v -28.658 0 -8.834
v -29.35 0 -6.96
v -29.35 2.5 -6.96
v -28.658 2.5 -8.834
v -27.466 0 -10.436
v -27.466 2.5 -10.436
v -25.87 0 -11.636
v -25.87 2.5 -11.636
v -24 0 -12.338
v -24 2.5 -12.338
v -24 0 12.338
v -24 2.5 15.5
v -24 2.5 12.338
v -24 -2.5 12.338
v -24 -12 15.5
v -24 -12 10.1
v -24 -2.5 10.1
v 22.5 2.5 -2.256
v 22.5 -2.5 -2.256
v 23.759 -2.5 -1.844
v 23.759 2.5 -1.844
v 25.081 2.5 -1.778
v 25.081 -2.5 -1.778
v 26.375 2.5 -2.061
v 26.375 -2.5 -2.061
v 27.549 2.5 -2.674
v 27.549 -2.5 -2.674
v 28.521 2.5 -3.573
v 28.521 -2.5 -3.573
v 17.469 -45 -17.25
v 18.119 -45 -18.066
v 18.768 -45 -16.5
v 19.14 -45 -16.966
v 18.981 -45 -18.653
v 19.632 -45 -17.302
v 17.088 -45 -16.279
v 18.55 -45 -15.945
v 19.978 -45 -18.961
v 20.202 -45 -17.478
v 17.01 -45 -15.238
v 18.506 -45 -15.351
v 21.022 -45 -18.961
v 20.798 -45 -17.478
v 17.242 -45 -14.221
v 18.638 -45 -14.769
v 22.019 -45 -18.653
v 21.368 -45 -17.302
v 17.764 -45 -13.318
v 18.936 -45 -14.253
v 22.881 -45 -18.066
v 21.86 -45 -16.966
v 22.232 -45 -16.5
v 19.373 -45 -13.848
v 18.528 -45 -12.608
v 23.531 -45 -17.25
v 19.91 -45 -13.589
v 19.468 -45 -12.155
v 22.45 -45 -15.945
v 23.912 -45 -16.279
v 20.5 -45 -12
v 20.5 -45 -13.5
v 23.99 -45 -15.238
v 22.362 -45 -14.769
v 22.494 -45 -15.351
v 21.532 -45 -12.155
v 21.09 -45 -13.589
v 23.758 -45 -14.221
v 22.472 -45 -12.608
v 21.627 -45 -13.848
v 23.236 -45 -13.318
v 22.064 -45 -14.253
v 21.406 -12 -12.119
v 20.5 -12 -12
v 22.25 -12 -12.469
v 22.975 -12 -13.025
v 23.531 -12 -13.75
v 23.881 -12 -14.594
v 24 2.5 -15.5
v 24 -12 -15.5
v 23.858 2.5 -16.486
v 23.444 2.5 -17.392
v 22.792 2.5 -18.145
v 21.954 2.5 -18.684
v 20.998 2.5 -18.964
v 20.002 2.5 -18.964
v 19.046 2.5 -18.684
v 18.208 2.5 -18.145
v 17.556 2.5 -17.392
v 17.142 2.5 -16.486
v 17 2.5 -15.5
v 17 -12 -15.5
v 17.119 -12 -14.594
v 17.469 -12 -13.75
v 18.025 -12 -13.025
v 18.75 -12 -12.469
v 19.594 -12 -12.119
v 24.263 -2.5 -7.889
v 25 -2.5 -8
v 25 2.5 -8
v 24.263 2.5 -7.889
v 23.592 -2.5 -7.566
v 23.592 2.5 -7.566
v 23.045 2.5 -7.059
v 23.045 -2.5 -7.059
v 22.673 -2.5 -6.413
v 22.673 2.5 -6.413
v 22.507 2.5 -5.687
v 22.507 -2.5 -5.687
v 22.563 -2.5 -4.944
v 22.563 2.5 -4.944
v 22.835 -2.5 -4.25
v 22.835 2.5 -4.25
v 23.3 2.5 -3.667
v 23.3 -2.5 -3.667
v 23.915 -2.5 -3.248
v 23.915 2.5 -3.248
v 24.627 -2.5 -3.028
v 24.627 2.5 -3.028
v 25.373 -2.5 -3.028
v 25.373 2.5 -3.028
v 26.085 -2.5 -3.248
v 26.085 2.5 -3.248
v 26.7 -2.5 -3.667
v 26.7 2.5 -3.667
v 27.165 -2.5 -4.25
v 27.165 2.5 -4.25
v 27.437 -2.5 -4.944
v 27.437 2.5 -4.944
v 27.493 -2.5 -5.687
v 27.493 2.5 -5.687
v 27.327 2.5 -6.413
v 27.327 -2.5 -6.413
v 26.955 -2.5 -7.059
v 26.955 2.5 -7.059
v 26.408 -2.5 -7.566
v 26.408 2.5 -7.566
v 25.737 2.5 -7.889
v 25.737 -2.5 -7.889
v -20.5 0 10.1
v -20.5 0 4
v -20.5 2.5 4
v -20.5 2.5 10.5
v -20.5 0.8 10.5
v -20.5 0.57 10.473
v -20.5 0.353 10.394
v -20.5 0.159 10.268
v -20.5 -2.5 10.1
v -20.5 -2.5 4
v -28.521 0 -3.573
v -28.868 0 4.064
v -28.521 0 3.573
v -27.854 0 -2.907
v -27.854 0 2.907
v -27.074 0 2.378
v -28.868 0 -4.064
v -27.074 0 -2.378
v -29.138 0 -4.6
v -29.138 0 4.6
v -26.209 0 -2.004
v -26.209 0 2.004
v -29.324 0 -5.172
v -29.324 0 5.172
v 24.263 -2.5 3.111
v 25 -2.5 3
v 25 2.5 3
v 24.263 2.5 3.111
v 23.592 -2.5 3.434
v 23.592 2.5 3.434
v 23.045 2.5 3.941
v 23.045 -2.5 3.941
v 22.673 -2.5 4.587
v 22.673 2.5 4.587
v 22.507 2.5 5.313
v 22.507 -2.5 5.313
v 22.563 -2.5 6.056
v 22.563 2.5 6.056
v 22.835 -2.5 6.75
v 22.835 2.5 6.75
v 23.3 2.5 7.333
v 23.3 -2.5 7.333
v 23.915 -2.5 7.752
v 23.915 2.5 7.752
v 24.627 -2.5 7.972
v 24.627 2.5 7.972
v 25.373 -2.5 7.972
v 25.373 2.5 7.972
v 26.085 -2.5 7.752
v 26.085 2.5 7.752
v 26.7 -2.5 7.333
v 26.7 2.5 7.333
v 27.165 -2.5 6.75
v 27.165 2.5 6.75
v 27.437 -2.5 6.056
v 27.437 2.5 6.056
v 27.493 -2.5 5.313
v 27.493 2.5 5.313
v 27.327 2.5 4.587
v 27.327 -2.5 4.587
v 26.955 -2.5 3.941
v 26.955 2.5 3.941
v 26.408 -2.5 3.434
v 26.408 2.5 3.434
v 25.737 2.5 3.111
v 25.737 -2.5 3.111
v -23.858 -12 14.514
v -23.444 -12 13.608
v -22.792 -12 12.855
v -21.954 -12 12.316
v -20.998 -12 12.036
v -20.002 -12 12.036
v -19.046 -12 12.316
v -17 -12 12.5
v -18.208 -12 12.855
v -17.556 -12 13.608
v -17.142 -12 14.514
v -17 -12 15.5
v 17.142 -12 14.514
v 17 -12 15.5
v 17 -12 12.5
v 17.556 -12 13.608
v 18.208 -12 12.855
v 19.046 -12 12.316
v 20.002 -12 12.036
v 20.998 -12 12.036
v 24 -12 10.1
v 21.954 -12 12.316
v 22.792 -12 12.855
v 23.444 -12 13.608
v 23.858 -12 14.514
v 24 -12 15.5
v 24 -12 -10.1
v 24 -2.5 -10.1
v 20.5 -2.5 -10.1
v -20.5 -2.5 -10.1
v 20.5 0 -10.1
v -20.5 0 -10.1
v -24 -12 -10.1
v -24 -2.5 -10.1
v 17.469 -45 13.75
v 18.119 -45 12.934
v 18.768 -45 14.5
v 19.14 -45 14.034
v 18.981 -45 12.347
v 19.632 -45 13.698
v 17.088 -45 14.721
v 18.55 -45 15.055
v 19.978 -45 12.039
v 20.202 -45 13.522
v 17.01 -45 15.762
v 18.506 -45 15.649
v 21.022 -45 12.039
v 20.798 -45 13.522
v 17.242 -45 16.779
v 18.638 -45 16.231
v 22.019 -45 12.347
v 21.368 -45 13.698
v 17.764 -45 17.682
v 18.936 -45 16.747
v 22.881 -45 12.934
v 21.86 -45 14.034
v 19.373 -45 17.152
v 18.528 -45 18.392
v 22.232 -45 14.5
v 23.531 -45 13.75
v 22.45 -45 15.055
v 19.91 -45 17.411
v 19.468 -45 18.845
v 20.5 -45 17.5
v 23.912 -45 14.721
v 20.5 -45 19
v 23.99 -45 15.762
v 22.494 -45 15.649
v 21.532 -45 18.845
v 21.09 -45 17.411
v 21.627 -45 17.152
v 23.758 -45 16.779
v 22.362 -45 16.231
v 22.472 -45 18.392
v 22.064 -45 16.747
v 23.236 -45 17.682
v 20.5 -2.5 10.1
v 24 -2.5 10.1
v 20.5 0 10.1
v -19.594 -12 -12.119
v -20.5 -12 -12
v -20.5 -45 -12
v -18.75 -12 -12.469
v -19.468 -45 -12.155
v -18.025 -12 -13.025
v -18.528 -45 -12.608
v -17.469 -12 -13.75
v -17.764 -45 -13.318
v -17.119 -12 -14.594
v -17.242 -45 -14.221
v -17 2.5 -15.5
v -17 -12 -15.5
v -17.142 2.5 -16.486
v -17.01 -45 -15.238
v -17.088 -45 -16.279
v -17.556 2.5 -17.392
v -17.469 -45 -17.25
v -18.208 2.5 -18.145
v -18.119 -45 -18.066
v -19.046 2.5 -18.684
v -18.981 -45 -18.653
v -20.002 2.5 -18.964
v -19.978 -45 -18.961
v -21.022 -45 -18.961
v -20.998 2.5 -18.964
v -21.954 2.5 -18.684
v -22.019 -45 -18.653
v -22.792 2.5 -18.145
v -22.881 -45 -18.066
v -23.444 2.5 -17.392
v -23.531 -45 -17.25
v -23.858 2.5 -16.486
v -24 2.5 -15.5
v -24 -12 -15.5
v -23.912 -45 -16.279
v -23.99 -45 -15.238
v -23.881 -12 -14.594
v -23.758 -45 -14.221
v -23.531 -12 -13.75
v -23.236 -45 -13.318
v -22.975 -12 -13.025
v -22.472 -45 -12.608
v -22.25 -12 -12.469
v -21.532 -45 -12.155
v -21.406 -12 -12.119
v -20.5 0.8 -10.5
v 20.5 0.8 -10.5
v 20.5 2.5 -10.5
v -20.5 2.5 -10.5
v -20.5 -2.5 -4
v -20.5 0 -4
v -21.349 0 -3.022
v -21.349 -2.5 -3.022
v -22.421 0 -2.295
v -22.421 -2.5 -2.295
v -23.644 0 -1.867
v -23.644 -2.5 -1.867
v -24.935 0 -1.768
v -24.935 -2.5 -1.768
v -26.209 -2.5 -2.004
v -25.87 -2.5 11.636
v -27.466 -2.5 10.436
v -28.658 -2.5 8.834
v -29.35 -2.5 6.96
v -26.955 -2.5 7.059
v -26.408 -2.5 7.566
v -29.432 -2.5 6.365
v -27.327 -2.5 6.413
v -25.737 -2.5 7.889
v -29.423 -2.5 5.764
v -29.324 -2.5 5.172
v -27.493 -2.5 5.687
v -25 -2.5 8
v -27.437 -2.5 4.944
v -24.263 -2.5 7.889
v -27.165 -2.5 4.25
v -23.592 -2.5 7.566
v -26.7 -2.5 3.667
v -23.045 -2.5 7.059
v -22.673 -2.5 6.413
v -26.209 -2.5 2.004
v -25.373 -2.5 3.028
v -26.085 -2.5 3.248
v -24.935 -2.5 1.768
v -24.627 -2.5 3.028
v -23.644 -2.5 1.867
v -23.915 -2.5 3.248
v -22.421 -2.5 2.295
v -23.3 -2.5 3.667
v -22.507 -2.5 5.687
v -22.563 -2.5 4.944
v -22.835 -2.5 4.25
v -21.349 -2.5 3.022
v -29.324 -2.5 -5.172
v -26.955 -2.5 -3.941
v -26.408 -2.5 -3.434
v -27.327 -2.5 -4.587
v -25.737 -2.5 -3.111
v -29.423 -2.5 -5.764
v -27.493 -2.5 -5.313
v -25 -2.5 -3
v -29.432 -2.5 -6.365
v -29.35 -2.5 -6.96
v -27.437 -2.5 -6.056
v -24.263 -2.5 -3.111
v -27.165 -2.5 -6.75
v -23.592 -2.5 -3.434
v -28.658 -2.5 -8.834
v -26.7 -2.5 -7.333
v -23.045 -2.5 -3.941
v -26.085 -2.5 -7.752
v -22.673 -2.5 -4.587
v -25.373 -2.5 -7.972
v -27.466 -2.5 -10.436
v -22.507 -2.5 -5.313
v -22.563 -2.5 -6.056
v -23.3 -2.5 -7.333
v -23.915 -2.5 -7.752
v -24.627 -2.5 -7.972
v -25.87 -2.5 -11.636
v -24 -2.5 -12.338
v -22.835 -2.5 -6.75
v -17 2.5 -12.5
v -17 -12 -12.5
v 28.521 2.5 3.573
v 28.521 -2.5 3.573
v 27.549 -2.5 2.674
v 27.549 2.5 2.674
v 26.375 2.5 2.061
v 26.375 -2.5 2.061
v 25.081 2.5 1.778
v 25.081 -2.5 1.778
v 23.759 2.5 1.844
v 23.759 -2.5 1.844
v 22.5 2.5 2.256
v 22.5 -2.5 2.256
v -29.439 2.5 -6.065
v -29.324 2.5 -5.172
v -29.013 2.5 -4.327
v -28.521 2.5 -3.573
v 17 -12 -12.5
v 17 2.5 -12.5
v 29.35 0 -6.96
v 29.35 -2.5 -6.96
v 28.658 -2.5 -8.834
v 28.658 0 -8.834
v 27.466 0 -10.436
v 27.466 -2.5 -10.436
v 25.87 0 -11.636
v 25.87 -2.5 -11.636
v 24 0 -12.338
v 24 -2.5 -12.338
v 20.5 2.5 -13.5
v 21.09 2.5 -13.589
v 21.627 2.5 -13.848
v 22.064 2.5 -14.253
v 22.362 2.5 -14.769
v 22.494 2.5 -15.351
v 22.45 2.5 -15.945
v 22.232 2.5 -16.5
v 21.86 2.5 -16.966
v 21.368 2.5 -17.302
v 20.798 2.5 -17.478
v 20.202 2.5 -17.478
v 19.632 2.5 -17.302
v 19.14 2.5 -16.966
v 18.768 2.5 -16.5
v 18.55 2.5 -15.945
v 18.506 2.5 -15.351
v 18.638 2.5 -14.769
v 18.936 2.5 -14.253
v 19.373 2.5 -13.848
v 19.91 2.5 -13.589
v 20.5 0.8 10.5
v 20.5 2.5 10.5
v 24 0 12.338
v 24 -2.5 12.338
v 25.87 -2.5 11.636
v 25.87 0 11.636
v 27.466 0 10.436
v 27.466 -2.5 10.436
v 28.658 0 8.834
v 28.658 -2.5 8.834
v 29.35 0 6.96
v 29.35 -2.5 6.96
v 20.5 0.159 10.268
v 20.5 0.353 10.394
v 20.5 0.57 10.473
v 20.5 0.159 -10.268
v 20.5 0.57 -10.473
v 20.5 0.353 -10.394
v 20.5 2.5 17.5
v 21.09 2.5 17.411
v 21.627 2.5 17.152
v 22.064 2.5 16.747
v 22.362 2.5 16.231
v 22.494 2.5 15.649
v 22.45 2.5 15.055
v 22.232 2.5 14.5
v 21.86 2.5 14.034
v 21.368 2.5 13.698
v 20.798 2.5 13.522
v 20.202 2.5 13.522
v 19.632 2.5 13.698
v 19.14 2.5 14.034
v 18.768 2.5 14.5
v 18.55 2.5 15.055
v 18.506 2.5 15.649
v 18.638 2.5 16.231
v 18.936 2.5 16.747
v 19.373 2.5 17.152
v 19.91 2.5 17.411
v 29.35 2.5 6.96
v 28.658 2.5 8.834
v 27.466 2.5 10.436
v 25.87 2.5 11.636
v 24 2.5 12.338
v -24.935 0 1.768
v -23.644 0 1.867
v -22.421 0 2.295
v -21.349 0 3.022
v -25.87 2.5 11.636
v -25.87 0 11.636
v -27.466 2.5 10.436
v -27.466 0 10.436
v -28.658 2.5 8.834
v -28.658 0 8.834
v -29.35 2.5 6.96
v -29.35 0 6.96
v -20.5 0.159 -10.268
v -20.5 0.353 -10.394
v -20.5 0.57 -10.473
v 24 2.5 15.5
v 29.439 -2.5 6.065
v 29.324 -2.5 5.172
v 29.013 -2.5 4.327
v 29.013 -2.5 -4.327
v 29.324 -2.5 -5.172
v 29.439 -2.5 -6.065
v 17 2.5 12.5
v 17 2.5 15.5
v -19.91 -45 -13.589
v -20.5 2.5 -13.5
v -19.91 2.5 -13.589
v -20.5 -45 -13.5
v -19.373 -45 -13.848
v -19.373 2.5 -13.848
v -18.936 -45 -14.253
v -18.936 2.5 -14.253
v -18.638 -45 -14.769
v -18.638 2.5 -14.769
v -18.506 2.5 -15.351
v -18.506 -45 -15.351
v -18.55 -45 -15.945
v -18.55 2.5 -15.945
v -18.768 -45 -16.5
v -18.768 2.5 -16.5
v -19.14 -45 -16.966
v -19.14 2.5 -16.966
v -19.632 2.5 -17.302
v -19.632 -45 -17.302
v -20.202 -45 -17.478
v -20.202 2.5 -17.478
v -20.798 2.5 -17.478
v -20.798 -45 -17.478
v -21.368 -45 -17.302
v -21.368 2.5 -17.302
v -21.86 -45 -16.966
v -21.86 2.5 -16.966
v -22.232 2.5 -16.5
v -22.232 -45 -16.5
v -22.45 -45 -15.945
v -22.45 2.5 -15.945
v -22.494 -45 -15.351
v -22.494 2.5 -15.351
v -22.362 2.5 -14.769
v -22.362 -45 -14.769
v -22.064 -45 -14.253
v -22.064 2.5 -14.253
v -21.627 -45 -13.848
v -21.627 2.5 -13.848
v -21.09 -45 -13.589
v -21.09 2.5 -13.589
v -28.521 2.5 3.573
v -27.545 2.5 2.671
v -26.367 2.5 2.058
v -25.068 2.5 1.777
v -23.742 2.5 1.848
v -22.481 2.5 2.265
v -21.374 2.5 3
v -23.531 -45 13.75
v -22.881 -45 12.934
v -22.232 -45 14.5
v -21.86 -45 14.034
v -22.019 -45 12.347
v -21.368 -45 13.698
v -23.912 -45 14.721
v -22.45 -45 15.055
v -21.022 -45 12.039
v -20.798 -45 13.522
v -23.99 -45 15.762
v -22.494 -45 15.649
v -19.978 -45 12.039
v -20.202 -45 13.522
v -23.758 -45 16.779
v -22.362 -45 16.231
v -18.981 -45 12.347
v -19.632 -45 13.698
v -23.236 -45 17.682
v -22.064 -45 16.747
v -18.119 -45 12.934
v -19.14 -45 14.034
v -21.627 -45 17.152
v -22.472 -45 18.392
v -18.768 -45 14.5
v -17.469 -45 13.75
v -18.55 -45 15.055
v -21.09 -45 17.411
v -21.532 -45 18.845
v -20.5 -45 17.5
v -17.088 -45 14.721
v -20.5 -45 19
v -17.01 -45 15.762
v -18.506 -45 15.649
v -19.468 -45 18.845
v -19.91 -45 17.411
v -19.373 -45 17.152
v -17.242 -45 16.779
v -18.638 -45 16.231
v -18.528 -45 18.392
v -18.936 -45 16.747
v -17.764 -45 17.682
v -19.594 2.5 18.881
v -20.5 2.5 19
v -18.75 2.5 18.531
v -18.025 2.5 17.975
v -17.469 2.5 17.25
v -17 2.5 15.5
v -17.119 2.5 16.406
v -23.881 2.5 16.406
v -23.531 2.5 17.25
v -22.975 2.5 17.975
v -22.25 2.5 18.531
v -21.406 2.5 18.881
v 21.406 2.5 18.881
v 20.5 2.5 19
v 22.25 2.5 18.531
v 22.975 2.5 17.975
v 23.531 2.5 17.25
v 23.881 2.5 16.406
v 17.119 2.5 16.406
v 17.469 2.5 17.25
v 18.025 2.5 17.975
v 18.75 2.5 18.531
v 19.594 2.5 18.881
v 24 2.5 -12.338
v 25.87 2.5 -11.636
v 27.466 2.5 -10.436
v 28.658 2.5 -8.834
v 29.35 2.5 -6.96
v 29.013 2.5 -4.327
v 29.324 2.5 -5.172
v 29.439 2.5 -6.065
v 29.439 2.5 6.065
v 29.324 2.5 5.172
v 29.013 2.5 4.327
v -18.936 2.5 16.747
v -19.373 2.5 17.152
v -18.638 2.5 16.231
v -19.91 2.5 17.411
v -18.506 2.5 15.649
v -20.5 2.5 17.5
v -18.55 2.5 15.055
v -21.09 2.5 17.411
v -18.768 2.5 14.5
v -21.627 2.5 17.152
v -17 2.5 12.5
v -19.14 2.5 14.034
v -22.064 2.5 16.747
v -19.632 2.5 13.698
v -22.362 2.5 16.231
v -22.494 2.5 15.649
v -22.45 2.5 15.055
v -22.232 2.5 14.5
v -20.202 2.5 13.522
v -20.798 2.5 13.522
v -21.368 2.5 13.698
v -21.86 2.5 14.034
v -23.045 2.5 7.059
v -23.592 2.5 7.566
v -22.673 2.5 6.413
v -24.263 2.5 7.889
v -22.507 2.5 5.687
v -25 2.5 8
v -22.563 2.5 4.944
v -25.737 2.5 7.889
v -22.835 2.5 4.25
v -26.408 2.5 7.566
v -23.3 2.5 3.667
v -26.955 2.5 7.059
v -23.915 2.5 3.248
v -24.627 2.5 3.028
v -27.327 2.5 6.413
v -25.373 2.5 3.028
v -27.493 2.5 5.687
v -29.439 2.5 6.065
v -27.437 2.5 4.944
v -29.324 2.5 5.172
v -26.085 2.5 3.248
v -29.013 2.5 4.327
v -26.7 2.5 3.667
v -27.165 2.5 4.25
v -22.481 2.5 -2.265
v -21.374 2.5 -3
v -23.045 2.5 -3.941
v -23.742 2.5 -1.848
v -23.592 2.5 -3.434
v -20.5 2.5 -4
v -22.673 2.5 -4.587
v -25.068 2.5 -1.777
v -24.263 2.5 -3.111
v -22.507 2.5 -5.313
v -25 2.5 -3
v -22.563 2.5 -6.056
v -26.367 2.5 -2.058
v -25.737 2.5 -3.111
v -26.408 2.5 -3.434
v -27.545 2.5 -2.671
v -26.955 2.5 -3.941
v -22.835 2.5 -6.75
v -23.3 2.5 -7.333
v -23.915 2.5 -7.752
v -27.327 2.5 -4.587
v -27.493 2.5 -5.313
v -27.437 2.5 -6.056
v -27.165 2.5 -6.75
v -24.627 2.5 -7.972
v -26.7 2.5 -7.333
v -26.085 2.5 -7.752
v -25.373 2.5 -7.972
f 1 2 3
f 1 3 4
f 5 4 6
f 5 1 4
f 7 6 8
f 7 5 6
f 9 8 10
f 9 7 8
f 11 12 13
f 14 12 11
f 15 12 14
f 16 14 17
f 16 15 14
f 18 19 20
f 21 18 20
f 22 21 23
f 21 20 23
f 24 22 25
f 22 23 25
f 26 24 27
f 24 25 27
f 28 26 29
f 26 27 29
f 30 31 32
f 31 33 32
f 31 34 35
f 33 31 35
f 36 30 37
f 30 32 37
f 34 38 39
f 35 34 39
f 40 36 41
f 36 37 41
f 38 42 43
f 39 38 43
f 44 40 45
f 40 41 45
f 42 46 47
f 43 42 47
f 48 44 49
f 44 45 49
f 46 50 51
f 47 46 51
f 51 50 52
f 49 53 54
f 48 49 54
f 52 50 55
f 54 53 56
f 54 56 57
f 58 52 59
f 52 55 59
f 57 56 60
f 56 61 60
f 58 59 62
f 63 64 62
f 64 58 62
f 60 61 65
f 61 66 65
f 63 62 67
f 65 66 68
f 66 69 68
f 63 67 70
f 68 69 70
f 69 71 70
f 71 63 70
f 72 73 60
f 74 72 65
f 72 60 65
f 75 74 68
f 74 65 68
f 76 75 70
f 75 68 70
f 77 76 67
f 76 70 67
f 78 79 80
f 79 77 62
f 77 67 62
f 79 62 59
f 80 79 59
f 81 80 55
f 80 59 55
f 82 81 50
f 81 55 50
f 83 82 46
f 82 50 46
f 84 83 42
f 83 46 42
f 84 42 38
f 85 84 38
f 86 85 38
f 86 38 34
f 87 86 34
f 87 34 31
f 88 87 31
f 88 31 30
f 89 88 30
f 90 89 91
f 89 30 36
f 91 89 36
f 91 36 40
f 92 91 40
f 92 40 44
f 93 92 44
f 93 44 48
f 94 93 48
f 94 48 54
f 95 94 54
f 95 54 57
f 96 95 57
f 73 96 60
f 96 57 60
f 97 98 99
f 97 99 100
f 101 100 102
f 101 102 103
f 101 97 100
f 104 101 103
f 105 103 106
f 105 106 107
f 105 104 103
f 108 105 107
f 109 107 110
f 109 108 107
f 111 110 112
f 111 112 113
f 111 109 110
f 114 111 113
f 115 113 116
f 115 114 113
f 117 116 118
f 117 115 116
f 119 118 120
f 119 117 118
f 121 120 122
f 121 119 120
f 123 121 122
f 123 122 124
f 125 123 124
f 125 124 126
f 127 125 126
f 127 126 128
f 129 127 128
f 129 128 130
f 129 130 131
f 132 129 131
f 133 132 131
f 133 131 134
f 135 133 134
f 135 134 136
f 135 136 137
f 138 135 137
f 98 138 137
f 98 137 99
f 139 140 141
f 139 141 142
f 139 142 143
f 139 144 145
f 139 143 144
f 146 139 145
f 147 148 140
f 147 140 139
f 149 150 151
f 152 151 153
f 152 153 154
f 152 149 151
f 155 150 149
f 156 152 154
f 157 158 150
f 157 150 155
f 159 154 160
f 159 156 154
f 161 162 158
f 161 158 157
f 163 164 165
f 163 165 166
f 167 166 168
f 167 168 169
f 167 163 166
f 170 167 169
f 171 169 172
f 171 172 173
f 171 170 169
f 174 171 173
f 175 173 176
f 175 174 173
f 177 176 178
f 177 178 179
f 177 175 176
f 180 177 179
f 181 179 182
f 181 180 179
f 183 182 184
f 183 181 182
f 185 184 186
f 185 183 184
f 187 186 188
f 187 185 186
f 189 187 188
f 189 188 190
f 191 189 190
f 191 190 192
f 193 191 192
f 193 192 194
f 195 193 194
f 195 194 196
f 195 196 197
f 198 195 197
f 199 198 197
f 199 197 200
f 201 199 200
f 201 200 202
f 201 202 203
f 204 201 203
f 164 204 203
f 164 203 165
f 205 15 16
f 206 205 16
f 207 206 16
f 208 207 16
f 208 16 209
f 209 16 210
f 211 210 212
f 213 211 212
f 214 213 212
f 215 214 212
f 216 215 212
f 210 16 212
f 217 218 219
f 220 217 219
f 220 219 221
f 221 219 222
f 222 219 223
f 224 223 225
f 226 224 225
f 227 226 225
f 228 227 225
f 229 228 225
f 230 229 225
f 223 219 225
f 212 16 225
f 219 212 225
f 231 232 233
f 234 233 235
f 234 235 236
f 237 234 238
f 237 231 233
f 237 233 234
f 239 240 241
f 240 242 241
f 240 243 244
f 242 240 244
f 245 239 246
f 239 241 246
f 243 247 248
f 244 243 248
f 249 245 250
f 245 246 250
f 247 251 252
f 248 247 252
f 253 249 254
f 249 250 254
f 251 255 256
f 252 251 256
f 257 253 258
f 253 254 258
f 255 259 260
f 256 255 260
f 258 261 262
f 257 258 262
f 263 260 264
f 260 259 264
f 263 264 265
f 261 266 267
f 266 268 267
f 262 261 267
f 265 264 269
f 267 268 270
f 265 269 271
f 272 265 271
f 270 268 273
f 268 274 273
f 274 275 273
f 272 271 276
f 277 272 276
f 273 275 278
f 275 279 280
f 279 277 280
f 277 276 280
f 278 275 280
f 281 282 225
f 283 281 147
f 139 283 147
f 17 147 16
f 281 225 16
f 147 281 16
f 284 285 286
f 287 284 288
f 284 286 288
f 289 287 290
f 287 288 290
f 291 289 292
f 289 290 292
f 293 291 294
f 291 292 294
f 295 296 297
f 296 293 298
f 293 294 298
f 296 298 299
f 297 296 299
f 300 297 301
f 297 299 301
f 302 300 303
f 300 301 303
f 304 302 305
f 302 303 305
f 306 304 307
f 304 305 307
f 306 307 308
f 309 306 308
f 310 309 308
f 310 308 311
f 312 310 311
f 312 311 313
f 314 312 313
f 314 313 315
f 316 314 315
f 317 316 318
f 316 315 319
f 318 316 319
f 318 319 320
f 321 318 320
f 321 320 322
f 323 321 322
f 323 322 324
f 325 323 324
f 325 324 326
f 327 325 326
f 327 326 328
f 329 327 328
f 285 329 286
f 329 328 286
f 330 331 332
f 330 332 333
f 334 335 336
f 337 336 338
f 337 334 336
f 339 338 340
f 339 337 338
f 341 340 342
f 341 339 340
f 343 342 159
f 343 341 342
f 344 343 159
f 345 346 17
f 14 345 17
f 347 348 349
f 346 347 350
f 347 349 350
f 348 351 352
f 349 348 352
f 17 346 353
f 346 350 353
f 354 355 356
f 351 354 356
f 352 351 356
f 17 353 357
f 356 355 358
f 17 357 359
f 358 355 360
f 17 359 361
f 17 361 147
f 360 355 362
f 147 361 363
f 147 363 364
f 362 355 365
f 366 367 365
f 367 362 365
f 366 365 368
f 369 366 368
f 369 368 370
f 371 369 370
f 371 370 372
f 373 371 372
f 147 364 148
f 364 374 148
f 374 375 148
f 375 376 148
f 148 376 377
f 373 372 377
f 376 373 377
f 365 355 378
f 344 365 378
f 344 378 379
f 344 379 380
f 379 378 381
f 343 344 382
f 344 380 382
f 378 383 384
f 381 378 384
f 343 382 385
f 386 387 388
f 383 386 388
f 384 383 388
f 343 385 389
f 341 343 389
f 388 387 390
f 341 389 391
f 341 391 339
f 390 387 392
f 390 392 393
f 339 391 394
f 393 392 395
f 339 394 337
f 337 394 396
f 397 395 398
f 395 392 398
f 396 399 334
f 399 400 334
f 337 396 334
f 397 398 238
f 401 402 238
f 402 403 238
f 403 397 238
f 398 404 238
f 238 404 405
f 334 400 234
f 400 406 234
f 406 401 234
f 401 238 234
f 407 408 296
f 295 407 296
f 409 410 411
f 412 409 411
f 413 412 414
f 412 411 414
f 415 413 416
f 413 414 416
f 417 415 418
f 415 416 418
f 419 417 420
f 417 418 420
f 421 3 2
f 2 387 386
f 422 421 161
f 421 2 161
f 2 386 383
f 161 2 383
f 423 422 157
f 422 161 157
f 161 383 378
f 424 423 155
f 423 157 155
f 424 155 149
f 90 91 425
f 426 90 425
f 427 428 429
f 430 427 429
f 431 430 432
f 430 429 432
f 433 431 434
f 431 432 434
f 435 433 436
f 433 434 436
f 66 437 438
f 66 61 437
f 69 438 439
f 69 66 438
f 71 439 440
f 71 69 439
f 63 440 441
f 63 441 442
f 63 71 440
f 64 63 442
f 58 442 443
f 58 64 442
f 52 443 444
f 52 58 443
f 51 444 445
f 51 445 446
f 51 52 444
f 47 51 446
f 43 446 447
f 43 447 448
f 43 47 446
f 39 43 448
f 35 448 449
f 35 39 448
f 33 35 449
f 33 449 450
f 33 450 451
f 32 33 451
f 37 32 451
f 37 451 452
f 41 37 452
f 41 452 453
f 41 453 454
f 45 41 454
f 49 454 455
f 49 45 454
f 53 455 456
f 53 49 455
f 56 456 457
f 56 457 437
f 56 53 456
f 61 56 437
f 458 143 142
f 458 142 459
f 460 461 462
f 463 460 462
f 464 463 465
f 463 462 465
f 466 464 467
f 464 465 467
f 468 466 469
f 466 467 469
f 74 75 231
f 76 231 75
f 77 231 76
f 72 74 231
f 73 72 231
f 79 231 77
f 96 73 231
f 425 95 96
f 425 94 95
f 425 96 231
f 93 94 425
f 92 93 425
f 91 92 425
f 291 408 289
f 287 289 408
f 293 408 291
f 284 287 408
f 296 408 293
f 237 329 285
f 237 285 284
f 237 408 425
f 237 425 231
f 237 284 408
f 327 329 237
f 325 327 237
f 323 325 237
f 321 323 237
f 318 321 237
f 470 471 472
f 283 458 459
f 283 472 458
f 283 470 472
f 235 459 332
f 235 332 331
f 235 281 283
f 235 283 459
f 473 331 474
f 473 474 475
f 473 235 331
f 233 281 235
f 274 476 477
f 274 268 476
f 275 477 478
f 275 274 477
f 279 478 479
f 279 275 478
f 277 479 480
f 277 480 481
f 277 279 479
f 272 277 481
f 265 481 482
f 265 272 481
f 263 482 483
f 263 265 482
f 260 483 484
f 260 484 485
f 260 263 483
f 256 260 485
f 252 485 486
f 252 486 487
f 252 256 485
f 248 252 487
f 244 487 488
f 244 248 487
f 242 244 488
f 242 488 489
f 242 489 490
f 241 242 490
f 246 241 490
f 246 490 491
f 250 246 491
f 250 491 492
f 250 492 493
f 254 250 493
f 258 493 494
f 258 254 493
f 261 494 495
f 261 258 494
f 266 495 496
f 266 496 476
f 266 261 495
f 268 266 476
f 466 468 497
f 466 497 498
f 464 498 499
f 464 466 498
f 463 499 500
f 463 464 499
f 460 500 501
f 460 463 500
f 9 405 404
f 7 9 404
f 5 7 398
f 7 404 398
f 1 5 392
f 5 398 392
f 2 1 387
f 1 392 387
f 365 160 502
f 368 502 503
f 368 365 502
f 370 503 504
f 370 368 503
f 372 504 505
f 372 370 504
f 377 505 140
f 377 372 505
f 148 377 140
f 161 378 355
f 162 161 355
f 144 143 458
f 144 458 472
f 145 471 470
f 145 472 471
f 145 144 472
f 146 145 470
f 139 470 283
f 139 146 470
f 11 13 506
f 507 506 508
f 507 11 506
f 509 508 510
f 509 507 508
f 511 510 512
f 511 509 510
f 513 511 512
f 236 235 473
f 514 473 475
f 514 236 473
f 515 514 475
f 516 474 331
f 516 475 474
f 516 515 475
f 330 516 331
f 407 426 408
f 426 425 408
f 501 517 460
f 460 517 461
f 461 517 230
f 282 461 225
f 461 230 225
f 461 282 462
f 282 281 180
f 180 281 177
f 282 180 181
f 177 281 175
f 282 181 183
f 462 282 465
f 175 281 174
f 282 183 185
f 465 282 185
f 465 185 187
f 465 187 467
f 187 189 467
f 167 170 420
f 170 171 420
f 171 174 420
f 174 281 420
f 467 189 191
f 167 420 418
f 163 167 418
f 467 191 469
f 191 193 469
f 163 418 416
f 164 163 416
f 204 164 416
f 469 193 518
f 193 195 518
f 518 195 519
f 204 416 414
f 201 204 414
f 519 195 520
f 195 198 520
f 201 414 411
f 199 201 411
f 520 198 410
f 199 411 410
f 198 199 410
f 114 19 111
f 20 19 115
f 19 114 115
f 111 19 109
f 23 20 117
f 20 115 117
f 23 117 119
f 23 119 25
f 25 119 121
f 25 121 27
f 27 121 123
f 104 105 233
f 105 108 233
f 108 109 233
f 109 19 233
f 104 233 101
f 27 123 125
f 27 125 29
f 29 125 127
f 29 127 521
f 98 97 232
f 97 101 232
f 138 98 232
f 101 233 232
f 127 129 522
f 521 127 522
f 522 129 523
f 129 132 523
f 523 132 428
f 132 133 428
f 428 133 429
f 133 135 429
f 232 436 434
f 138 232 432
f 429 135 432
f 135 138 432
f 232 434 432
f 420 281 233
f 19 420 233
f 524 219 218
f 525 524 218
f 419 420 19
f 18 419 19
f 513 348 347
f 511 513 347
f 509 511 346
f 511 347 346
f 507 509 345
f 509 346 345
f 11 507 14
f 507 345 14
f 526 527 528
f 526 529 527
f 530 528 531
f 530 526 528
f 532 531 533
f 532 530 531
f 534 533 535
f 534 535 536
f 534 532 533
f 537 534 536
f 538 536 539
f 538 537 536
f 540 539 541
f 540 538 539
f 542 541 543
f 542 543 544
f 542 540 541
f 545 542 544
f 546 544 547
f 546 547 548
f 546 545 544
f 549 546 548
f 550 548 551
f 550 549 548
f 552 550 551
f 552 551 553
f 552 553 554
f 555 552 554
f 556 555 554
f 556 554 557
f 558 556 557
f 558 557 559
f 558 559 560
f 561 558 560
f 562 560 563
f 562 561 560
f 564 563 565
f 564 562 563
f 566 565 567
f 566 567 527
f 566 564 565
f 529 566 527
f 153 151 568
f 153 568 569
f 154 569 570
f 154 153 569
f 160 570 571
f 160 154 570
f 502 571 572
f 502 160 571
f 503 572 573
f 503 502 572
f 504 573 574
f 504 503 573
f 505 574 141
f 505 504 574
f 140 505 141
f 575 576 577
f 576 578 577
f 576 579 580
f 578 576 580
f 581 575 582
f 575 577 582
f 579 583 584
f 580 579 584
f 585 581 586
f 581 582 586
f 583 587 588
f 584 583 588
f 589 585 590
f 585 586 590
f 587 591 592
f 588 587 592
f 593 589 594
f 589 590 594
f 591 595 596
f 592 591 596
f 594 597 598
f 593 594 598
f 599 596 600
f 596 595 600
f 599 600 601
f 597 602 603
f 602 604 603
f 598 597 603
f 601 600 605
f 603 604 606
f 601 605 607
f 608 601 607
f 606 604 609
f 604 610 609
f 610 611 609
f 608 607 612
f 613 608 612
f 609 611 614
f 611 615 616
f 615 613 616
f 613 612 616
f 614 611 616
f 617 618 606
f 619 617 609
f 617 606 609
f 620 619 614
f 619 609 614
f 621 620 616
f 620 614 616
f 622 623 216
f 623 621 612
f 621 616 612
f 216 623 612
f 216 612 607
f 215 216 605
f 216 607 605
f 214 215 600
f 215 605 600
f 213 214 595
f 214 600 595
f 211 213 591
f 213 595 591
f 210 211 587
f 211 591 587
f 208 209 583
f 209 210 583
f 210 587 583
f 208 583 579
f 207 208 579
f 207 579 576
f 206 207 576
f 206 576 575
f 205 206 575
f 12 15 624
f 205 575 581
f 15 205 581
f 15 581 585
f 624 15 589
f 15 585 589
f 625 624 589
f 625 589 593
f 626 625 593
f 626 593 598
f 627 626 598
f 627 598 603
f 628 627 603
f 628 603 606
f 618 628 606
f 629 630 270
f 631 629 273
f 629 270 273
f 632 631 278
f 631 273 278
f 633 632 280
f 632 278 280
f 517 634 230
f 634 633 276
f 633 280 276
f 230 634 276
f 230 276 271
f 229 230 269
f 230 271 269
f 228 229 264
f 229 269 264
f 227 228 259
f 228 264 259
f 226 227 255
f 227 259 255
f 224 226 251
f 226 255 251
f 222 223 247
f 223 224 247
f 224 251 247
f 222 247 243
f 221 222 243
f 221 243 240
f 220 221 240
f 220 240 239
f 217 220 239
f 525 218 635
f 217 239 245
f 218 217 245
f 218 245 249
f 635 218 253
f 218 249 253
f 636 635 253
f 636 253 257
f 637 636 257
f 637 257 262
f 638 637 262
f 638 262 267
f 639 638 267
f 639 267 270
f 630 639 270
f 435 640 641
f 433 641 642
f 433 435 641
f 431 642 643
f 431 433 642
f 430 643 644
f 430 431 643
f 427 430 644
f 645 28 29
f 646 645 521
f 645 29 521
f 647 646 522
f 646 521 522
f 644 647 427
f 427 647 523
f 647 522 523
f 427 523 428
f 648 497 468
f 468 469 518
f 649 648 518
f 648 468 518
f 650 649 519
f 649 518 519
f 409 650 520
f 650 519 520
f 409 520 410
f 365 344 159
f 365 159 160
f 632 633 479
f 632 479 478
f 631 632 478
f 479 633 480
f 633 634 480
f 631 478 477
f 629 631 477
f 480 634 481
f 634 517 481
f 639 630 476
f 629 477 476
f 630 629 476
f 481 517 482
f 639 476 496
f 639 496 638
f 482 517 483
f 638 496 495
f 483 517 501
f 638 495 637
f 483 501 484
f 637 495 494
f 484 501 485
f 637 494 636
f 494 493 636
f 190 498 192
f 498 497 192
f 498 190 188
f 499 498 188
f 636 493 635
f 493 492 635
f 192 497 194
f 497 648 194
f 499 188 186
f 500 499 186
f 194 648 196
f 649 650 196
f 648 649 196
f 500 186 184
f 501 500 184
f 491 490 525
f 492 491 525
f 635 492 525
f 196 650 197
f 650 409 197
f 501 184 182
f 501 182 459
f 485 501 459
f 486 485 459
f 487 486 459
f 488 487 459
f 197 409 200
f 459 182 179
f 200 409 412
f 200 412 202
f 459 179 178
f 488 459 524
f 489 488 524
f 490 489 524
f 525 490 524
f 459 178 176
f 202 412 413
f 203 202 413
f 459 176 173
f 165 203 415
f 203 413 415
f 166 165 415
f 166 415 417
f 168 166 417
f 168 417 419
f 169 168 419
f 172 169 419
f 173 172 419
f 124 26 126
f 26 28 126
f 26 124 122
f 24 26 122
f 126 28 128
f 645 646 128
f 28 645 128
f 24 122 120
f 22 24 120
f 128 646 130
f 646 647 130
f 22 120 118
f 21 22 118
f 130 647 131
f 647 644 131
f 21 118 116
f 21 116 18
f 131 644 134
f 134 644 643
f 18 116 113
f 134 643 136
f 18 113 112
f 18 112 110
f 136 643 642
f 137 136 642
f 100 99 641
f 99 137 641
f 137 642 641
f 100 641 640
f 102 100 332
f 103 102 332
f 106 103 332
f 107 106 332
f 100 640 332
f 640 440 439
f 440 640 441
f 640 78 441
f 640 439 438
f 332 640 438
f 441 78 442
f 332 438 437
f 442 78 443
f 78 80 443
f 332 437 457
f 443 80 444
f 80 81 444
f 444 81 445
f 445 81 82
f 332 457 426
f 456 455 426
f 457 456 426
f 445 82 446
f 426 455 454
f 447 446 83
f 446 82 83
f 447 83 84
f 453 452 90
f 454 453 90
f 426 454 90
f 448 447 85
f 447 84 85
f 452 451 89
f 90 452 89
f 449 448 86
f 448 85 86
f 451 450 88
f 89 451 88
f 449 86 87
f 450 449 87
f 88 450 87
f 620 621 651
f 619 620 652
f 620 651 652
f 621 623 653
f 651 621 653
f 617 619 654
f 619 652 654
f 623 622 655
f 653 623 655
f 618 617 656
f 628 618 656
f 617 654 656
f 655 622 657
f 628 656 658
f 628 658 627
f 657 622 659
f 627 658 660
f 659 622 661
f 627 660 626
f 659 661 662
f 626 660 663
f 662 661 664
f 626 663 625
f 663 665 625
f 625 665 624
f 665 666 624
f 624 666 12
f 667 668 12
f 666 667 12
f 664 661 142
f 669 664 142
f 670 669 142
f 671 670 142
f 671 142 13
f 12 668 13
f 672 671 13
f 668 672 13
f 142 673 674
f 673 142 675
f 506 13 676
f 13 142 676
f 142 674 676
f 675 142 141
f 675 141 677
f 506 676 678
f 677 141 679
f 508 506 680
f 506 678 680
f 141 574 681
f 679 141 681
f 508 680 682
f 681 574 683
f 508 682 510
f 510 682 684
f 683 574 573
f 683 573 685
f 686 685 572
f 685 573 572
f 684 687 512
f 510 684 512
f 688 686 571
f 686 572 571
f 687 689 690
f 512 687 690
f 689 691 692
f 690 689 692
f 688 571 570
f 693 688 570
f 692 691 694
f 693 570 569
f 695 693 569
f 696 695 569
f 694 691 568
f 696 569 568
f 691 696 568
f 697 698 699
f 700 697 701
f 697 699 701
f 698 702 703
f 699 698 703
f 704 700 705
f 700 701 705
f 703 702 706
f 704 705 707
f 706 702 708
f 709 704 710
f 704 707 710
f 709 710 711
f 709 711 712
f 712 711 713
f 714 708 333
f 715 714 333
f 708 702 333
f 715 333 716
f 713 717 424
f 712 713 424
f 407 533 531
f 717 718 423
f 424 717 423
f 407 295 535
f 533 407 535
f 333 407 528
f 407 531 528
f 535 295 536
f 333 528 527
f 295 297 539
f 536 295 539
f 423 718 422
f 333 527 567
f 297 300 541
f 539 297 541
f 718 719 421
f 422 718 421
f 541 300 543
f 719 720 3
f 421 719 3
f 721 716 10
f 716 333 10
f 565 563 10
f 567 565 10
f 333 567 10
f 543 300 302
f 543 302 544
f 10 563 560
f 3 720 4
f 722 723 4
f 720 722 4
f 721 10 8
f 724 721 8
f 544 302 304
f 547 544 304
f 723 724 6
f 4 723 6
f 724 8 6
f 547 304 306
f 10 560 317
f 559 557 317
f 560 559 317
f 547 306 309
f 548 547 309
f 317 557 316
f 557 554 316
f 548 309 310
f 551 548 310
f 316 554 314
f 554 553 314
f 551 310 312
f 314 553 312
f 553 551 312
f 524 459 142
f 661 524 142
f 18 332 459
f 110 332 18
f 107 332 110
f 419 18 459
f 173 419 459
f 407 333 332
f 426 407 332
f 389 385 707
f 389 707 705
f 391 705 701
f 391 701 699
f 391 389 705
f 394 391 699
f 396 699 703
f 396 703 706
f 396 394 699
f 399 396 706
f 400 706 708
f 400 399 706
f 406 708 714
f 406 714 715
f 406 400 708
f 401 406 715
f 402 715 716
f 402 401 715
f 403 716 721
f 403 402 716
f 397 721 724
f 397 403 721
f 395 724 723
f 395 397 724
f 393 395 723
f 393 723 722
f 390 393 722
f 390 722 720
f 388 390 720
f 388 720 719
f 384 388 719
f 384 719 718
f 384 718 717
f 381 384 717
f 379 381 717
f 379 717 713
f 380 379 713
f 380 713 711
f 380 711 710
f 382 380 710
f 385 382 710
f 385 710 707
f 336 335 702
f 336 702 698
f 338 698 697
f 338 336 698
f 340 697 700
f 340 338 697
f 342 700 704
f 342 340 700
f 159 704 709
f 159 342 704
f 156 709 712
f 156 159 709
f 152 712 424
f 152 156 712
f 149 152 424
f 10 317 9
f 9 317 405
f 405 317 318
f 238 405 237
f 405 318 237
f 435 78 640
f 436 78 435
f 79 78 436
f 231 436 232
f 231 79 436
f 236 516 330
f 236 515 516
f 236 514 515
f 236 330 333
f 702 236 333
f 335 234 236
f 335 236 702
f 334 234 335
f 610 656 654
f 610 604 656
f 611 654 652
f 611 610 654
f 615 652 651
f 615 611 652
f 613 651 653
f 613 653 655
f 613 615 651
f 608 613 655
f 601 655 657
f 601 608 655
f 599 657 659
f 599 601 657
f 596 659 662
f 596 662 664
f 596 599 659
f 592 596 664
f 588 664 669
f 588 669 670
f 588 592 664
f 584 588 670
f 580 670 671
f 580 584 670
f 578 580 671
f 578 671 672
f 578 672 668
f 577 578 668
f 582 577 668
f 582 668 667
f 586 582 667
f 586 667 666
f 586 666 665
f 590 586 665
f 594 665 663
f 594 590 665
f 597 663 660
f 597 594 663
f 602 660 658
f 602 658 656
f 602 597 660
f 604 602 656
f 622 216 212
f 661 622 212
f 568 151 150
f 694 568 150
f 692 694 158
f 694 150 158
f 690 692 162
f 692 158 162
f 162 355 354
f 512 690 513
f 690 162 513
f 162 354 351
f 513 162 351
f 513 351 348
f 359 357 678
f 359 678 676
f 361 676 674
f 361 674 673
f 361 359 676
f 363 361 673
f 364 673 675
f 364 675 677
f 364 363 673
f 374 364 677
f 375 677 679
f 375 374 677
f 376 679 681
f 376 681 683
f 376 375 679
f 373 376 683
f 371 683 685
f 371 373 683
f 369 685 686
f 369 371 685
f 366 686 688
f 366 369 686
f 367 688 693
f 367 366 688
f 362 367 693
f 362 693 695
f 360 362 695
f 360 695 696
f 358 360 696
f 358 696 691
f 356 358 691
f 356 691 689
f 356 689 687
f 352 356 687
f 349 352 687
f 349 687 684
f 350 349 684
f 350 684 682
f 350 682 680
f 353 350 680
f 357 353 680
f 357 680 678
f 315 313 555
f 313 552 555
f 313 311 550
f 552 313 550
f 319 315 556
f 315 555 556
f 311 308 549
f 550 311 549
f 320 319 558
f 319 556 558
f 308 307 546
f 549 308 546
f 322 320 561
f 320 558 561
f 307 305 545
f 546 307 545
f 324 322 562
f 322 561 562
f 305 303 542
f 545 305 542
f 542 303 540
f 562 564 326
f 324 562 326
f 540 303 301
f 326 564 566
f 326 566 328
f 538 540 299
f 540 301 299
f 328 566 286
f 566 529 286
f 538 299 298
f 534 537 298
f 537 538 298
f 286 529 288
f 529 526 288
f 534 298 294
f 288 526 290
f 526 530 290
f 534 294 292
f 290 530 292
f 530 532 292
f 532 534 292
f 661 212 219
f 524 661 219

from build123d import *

# Parameters (mm, degrees)
SKETCH1_R           = 2.5
BOSS_EXTRUDE1_DEPTH = 2.5
BOSS_EXTRUDE2_START = -45
SKETCH4_R           = 3.5
SKETCH4_R_2         = 2
BOSS_EXTRUDE2_DEPTH = 47.5
BOSS_EXTRUDE3_START = -2.5
SKETCH5_R           = 2.5
BOSS_EXTRUDE3_DEPTH = 2.5
BOSS_EXTRUDE4_START = -12
BOSS_EXTRUDE4_DEPTH = 12
BOSS_EXTRUDE5_DEPTH = 2.5
FILLET2_R           = 1
FILLET3_R           = 1


with BuildPart() as part:
    # Sketch1 → Boss-Extrude1 (new body)
    with BuildSketch(Plane(origin=(0, 0, 0), x_dir=(1, 0, 0), z_dir=(0, 1, 0))):
        with BuildLine():
            Line((20.5, 10.5), (-20.5, 10.5))
            Line((-20.5, 10.5), (-20.5, 4))
            ThreePointArc((-20.5, 4), (-24.40287122, 1.76806345), (-28.520566145, 3.573204173))
            ThreePointArc((-28.520566145, 3.573204173), (-29.324072849, 5.171652721), (-29.350396575, 6.960498116))
            ThreePointArc((-29.350396575, 6.960498116), (-26.904940816, 10.941842627), (-22.5, 12.5))
            Line((-22.5, 12.5), (22.5, 12.5))
            ThreePointArc((22.5, 12.5), (26.904940816, 10.941842627), (29.350396575, 6.960498116))
            ThreePointArc((29.350396575, 6.960498116), (29.324072849, 5.171652721), (28.520566145, 3.573204173))
            ThreePointArc((28.520566145, 3.573204173), (25.737402548, 1.876578025), (22.5, 2.2557411))
            Line((22.5, 2.2557411), (22.5, -2.2557411))
            ThreePointArc((22.5, -2.2557411), (25.737402548, -1.876578025), (28.520566145, -3.573204173))
            ThreePointArc((28.520566145, -3.573204173), (29.324072849, -5.171652721), (29.350396575, -6.960498116))
            ThreePointArc((29.350396575, -6.960498116), (26.904940816, -10.941842627), (22.5, -12.5))
            Line((22.5, -12.5), (-22.5, -12.5))
            ThreePointArc((-22.5, -12.5), (-26.904940816, -10.941842627), (-29.350396575, -6.960498116))
            ThreePointArc((-29.350396575, -6.960498116), (-29.324072849, -5.171652721), (-28.520566145, -3.573204173))
            ThreePointArc((-28.520566145, -3.573204173), (-24.40287122, -1.76806345), (-20.5, -4))
            Line((-20.5, -4), (-20.5, -10.5))
            Line((-20.5, -10.5), (20.5, -10.5))
            Line((20.5, -10.5), (20.5, 10.5))
        make_face()
        with Locations(Location((-25, 5.5, 0), (0, 0, 270))):
            Circle(SKETCH1_R, mode=Mode.SUBTRACT)
        with Locations(Location((-25, -5.5, 0), (0, 0, 270))):
            Circle(SKETCH1_R, mode=Mode.SUBTRACT)
        with Locations(Location((25, -5.5, 0), (0, 0, 90))):
            Circle(SKETCH1_R, mode=Mode.SUBTRACT)
        with Locations(Location((25, 5.5, 0), (0, 0, 90))):
            Circle(SKETCH1_R, mode=Mode.SUBTRACT)
    extrude(amount=BOSS_EXTRUDE1_DEPTH)

    # Sketch4 → Boss-Extrude2 (add)
    # profile 1 of 4: a face of its own
    with BuildSketch(Plane(origin=(0, 0, 0), x_dir=(1, 0, 0), z_dir=(0, 1, 0)).offset(BOSS_EXTRUDE2_START)):
        with Locations(Location((-20.5, 15.5, 0), (0, 0, 270))):
            Circle(SKETCH4_R)
        with Locations(Location((-20.5, 15.5, 0), (0, 0, 270))):
            Circle(SKETCH4_R_2, mode=Mode.SUBTRACT)
    # profile 2 of 4: a face of its own
    with BuildSketch(Plane(origin=(0, 0, 0), x_dir=(1, 0, 0), z_dir=(0, 1, 0)).offset(BOSS_EXTRUDE2_START)):
        with Locations(Location((20.5, 15.5, 0), (0, 0, 270))):
            Circle(SKETCH4_R)
        with Locations(Location((20.5, 15.5, 0), (0, 0, 270))):
            Circle(SKETCH4_R_2, mode=Mode.SUBTRACT)
    # profile 3 of 4: a face of its own
    with BuildSketch(Plane(origin=(0, 0, 0), x_dir=(1, 0, 0), z_dir=(0, 1, 0)).offset(BOSS_EXTRUDE2_START)):
        with Locations(Location((-20.5, -15.5, 0), (0, 0, 270))):
            Circle(SKETCH4_R)
        with Locations(Location((-20.5, -15.5, 0), (0, 0, 270))):
            Circle(SKETCH4_R_2, mode=Mode.SUBTRACT)
    # profile 4 of 4: a face of its own
    with BuildSketch(Plane(origin=(0, 0, 0), x_dir=(1, 0, 0), z_dir=(0, 1, 0)).offset(BOSS_EXTRUDE2_START)):
        with Locations(Location((20.5, -15.5, 0), (0, 0, 270))):
            Circle(SKETCH4_R)
        with Locations(Location((20.5, -15.5, 0), (0, 0, 270))):
            Circle(SKETCH4_R_2, mode=Mode.SUBTRACT)
    extrude(amount=BOSS_EXTRUDE2_DEPTH)

    # Sketch5 → Boss-Extrude3 (add)
    with BuildSketch(Plane(origin=(0, 0, 0), x_dir=(1, 0, 0), z_dir=(0, 1, 0)).offset(BOSS_EXTRUDE3_START)):
        with BuildLine():
            Line((-29.324072849, 5.171652721), (-29.324072849, -5.171652721))
            ThreePointArc((-29.324072849, -5.171652721), (-29.438527194, -6.064584851), (-29.350396575, -6.960498116))
            ThreePointArc((-29.350396575, -6.960498116), (-27.465923203, -10.435821373), (-24, -12.337527971))
            Line((-24, -12.337527971), (-24, -15.5))
            Line((-24, -15.5), (-22.5, -15.5))
            ThreePointArc((-22.5, -15.5), (-20.5, -13.5), (-18.5, -15.5))
            Line((-18.5, -15.5), (-17, -15.5))
            Line((-17, -15.5), (-17, -12.5))
            Line((-17, -12.5), (17, -12.5))
            Line((17, -12.5), (17, -15.5))
            Line((17, -15.5), (18.5, -15.5))
            ThreePointArc((18.5, -15.5), (20.5, -13.5), (22.5, -15.5))
            Line((22.5, -15.5), (24, -15.5))
            Line((24, -15.5), (24, -12.337527971))
            ThreePointArc((24, -12.337527971), (27.465923203, -10.435821373), (29.350396575, -6.960498116))
            ThreePointArc((29.350396575, -6.960498116), (29.324072849, -5.171652721), (28.520566145, -3.573204173))
            ThreePointArc((28.520566145, -3.573204173), (25.737402548, -1.876578025), (22.5, -2.2557411))
            Line((22.5, -2.2557411), (22.5, 2.2557411))
            ThreePointArc((22.5, 2.2557411), (25.737402548, 1.876578025), (28.520566145, 3.573204173))
            ThreePointArc((28.520566145, 3.573204173), (29.324072849, 5.171652721), (29.350396575, 6.960498116))
            ThreePointArc((29.350396575, 6.960498116), (27.465923203, 10.435821373), (24, 12.337527971))
            Line((24, 12.337527971), (24, 15.5))
            Line((24, 15.5), (22.5, 15.5))
            ThreePointArc((22.5, 15.5), (20.5, 13.5), (18.5, 15.5))
            Line((18.5, 15.5), (17, 15.5))
            Line((17, 15.5), (17, 12.5))
            Line((17, 12.5), (-17, 12.5))
            Line((-17, 12.5), (-17, 15.5))
            Line((-17, 15.5), (-18.5, 15.5))
            ThreePointArc((-18.5, 15.5), (-20.5, 13.5), (-22.5, 15.5))
            Line((-22.5, 15.5), (-24, 15.5))
            Line((-24, 15.5), (-24, 12.337527971))
            ThreePointArc((-24, 12.337527971), (-27.465923203, 10.435821373), (-29.350396575, 6.960498116))
            ThreePointArc((-29.350396575, 6.960498116), (-29.438527194, 6.064584851), (-29.324072849, 5.171652721))
        make_face()
        with Locations(Location((-25, 5.5, 0), (0, 0, 270))):
            Circle(SKETCH5_R, mode=Mode.SUBTRACT)
        with Locations(Location((-25, -5.5, 0), (0, 0, 270))):
            Circle(SKETCH5_R, mode=Mode.SUBTRACT)
        with Locations(Location((25, -5.5, 0), (0, 0, 90))):
            Circle(SKETCH5_R, mode=Mode.SUBTRACT)
        with Locations(Location((25, 5.5, 0), (0, 0, 90))):
            Circle(SKETCH5_R, mode=Mode.SUBTRACT)
        with BuildLine():
            Line((-26.208643878, 2.004095257), (-26.208643878, -2.004095257))
            ThreePointArc((-26.208643878, -2.004095257), (-23.018368657, -2.041161266), (-20.5, -4))
            Line((-20.5, -4), (-20.5, -10.5))
            Line((-20.5, -10.5), (20.5, -10.5))
            Line((20.5, -10.5), (20.5, 10.5))
            Line((20.5, 10.5), (-20.5, 10.5))
            Line((-20.5, 10.5), (-20.5, 4))
            ThreePointArc((-20.5, 4), (-23.018368657, 2.041161266), (-26.208643878, 2.004095257))
        make_face(mode=Mode.SUBTRACT)
    extrude(amount=BOSS_EXTRUDE3_DEPTH)

    # Sketch6 → Boss-Extrude4 (add)
    with BuildSketch(Plane(origin=(0, 0, 0), x_dir=(1, 0, 0), z_dir=(0, 1, 0)).offset(BOSS_EXTRUDE4_START)):
        with BuildLine():
            Line((-24, 15.5), (-22.5, 15.5))
            ThreePointArc((-22.5, 15.5), (-20.5, 13.5), (-18.5, 15.5))
            Line((-18.5, 15.5), (-17, 15.5))
            Line((-17, 15.5), (-17, 12.5))
            Line((-17, 12.5), (17, 12.5))
            Line((17, 12.5), (17, 15.5))
            Line((17, 15.5), (18.5, 15.5))
            ThreePointArc((18.5, 15.5), (20.5, 13.5), (22.5, 15.5))
            Line((22.5, 15.5), (24, 15.5))
            Line((24, 15.5), (24, 10.1))
            Line((24, 10.1), (-24, 10.1))
            Line((-24, 10.1), (-24, 15.5))
        make_face()
        with BuildLine():
            Line((24, -15.5), (24, -10.1))
            Line((24, -10.1), (-24, -10.1))
            Line((-24, -10.1), (-24, -15.5))
            Line((-24, -15.5), (-22.5, -15.5))
            ThreePointArc((-22.5, -15.5), (-20.5, -13.5), (-18.5, -15.5))
            Line((-18.5, -15.5), (-17, -15.5))
            Line((-17, -15.5), (-17, -12.5))
            Line((-17, -12.5), (17, -12.5))
            Line((17, -12.5), (17, -15.5))
            Line((17, -15.5), (18.5, -15.5))
            ThreePointArc((18.5, -15.5), (20.5, -13.5), (22.5, -15.5))
            Line((22.5, -15.5), (24, -15.5))
        make_face()
    extrude(amount=BOSS_EXTRUDE4_DEPTH)

    # Sketch7 → Boss-Extrude5 (add)
    with BuildSketch(Plane(origin=(0, 0, 0), x_dir=(1, 0, 0), z_dir=(0, 1, 0))):
        with BuildLine():
            Line((-24, -15.5), (-24, -10.98088563))
            Line((-24, -10.98088563), (-17, -10.98088563))
            Line((-17, -10.98088563), (-17, -15.5))
            ThreePointArc((-17, -15.5), (-20.5, -12), (-24, -15.5))
        make_face()
        with BuildLine():
            Line((17, -15.5), (17, -10.98088563))
            Line((17, -10.98088563), (24, -10.98088563))
            Line((24, -10.98088563), (24, -15.5))
            ThreePointArc((24, -15.5), (20.5, -12), (17, -15.5))
        make_face()
        with BuildLine():
            Line((24, 10.98088563), (24, 15.5))
            ThreePointArc((24, 15.5), (20.5, 12), (17, 15.5))
            Line((17, 15.5), (17, 10.98088563))
            Line((17, 10.98088563), (24, 10.98088563))
        make_face()
        with BuildLine():
            Line((-24, 10.98088563), (-17, 10.98088563))
            Line((-17, 10.98088563), (-17, 15.5))
            ThreePointArc((-17, 15.5), (-20.5, 12), (-24, 15.5))
            Line((-24, 15.5), (-24, 10.98088563))
        make_face()
    extrude(amount=BOSS_EXTRUDE5_DEPTH)

    # Fillet2
    # the kernel refuses this fillet: 1 mm, written as the material it adds along each edge
    with BuildSketch(Plane(origin=(-22.5, 0, -10.5), x_dir=(0, 1, 0), z_dir=(1, 0, 0))) as fillet2_piece_1:
        with BuildLine():
            CenterArc((0.8, 1), FILLET2_R, 216.869897646, 53.130102354)
            Line((0, 0.4), (-0.016, 0.388))
            ThreePointArc((-0.016, 0.388), (-0.02, 0.2), (-0.02, 0))
            Line((-0.02, 0), (0, -0.02))
            Line((0, -0.02), (0.8, -0.02))
            Line((0.8, -0.02), (0.8, 0))
        make_face()
    extrude(amount=45)

    # Fillet3
    # the kernel refuses this fillet: 1 mm, written as the material it adds along each edge
    with BuildSketch(Plane(origin=(-22.5, 0, 10.5), x_dir=(0, 0, -1), z_dir=(1, 0, 0))) as fillet3_piece_1:
        with BuildLine():
            CenterArc((1, 0.8), FILLET3_R, 180, 53.130102354)
            Line((0, 0.8), (-0.02, 0.8))
            Line((-0.02, 0.8), (-0.02, 0))
            Line((-0.02, 0), (0, -0.02))
            ThreePointArc((0, -0.02), (0.2, -0.02), (0.388, -0.016))
            Line((0.388, -0.016), (0.4, 0))
        make_face()
    extrude(amount=45)


solid = part.part
